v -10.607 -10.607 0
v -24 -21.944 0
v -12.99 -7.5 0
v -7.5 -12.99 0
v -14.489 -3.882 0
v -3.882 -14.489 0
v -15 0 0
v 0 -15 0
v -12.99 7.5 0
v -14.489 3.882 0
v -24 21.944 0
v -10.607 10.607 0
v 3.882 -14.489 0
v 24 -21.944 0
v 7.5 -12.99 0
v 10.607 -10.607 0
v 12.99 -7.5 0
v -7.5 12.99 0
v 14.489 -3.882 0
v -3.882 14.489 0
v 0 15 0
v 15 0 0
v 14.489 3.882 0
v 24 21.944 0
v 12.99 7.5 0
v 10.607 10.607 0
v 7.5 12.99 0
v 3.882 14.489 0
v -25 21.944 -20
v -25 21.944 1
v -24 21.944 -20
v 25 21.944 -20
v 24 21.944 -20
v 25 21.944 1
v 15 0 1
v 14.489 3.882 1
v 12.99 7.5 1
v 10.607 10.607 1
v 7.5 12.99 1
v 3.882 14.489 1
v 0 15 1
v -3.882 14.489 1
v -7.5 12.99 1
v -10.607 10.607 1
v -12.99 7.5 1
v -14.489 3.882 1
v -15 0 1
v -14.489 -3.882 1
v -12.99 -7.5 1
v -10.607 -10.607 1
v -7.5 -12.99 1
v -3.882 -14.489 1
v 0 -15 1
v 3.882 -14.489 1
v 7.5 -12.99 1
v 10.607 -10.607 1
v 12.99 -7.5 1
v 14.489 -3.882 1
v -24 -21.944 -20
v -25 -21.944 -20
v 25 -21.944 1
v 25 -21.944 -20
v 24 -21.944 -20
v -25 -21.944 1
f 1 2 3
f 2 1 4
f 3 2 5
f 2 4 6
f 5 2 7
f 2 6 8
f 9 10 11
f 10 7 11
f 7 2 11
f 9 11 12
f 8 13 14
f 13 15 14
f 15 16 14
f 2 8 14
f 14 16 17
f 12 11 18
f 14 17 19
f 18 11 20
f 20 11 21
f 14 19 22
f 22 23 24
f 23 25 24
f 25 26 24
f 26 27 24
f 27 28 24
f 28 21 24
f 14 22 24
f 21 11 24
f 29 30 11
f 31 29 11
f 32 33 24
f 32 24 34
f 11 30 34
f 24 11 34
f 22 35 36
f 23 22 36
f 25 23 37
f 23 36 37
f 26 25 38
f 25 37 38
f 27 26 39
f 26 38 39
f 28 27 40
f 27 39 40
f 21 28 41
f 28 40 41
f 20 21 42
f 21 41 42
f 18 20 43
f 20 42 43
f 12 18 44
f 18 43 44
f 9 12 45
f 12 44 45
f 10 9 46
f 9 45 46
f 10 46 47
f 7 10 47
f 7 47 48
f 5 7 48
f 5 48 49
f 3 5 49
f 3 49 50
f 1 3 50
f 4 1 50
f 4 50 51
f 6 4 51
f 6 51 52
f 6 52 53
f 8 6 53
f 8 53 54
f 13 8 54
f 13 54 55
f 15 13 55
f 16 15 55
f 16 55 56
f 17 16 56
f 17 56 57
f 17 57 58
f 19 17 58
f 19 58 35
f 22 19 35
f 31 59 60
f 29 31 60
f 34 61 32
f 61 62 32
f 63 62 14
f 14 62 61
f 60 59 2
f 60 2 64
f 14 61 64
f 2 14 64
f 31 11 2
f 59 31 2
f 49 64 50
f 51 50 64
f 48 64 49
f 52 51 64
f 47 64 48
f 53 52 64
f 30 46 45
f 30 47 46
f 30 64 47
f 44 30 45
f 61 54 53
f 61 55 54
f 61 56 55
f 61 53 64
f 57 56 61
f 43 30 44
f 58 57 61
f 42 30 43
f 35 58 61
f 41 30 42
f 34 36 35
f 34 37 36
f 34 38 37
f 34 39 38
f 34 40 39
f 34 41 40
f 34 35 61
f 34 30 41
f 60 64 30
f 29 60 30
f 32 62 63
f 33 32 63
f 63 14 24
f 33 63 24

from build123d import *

# Parameters (mm, degrees)
SKETCH1_W           = 50.000000596
SKETCH1_H           = 43.88833532
BOSS_EXTRUDE1_DEPTH = 1
SKETCH2_W           = 1
SKETCH2_H           = 43.88833532
BOSS_EXTRUDE3_DEPTH = 20
SKETCH3_R           = 15
CUT_EXTRUDE1_DEPTH  = 40.338867665


with BuildPart() as part:
    # Sketch1 → Boss-Extrude1 (new body)
    with BuildSketch(Plane.XY):
        Rectangle(SKETCH1_W, SKETCH1_H)
    extrude(amount=BOSS_EXTRUDE1_DEPTH)

    # Sketch2 → Boss-Extrude3 (add)
    with BuildSketch(Plane(origin=(0, 0, 0), x_dir=(-1, 0, 0), z_dir=(0, 0, -1))):
        Polygon((25.000000298, 21.94416766), (24.000000298, 21.94416766), (24.000000298, -21.94416766), (25.000000298, -21.94416766), (25.000000298, 21.001254621), align=None)
        with Locations((-24.500000298, 0)):
            Rectangle(SKETCH2_W, SKETCH2_H)
    extrude(amount=BOSS_EXTRUDE3_DEPTH)

    # Sketch3 → Cut-Extrude1 (cut, through all)
    with BuildSketch(Plane.XY.offset(1)):
        Circle(SKETCH3_R)
    extrude(amount=-CUT_EXTRUDE1_DEPTH, mode=Mode.SUBTRACT)


solid = part.part
